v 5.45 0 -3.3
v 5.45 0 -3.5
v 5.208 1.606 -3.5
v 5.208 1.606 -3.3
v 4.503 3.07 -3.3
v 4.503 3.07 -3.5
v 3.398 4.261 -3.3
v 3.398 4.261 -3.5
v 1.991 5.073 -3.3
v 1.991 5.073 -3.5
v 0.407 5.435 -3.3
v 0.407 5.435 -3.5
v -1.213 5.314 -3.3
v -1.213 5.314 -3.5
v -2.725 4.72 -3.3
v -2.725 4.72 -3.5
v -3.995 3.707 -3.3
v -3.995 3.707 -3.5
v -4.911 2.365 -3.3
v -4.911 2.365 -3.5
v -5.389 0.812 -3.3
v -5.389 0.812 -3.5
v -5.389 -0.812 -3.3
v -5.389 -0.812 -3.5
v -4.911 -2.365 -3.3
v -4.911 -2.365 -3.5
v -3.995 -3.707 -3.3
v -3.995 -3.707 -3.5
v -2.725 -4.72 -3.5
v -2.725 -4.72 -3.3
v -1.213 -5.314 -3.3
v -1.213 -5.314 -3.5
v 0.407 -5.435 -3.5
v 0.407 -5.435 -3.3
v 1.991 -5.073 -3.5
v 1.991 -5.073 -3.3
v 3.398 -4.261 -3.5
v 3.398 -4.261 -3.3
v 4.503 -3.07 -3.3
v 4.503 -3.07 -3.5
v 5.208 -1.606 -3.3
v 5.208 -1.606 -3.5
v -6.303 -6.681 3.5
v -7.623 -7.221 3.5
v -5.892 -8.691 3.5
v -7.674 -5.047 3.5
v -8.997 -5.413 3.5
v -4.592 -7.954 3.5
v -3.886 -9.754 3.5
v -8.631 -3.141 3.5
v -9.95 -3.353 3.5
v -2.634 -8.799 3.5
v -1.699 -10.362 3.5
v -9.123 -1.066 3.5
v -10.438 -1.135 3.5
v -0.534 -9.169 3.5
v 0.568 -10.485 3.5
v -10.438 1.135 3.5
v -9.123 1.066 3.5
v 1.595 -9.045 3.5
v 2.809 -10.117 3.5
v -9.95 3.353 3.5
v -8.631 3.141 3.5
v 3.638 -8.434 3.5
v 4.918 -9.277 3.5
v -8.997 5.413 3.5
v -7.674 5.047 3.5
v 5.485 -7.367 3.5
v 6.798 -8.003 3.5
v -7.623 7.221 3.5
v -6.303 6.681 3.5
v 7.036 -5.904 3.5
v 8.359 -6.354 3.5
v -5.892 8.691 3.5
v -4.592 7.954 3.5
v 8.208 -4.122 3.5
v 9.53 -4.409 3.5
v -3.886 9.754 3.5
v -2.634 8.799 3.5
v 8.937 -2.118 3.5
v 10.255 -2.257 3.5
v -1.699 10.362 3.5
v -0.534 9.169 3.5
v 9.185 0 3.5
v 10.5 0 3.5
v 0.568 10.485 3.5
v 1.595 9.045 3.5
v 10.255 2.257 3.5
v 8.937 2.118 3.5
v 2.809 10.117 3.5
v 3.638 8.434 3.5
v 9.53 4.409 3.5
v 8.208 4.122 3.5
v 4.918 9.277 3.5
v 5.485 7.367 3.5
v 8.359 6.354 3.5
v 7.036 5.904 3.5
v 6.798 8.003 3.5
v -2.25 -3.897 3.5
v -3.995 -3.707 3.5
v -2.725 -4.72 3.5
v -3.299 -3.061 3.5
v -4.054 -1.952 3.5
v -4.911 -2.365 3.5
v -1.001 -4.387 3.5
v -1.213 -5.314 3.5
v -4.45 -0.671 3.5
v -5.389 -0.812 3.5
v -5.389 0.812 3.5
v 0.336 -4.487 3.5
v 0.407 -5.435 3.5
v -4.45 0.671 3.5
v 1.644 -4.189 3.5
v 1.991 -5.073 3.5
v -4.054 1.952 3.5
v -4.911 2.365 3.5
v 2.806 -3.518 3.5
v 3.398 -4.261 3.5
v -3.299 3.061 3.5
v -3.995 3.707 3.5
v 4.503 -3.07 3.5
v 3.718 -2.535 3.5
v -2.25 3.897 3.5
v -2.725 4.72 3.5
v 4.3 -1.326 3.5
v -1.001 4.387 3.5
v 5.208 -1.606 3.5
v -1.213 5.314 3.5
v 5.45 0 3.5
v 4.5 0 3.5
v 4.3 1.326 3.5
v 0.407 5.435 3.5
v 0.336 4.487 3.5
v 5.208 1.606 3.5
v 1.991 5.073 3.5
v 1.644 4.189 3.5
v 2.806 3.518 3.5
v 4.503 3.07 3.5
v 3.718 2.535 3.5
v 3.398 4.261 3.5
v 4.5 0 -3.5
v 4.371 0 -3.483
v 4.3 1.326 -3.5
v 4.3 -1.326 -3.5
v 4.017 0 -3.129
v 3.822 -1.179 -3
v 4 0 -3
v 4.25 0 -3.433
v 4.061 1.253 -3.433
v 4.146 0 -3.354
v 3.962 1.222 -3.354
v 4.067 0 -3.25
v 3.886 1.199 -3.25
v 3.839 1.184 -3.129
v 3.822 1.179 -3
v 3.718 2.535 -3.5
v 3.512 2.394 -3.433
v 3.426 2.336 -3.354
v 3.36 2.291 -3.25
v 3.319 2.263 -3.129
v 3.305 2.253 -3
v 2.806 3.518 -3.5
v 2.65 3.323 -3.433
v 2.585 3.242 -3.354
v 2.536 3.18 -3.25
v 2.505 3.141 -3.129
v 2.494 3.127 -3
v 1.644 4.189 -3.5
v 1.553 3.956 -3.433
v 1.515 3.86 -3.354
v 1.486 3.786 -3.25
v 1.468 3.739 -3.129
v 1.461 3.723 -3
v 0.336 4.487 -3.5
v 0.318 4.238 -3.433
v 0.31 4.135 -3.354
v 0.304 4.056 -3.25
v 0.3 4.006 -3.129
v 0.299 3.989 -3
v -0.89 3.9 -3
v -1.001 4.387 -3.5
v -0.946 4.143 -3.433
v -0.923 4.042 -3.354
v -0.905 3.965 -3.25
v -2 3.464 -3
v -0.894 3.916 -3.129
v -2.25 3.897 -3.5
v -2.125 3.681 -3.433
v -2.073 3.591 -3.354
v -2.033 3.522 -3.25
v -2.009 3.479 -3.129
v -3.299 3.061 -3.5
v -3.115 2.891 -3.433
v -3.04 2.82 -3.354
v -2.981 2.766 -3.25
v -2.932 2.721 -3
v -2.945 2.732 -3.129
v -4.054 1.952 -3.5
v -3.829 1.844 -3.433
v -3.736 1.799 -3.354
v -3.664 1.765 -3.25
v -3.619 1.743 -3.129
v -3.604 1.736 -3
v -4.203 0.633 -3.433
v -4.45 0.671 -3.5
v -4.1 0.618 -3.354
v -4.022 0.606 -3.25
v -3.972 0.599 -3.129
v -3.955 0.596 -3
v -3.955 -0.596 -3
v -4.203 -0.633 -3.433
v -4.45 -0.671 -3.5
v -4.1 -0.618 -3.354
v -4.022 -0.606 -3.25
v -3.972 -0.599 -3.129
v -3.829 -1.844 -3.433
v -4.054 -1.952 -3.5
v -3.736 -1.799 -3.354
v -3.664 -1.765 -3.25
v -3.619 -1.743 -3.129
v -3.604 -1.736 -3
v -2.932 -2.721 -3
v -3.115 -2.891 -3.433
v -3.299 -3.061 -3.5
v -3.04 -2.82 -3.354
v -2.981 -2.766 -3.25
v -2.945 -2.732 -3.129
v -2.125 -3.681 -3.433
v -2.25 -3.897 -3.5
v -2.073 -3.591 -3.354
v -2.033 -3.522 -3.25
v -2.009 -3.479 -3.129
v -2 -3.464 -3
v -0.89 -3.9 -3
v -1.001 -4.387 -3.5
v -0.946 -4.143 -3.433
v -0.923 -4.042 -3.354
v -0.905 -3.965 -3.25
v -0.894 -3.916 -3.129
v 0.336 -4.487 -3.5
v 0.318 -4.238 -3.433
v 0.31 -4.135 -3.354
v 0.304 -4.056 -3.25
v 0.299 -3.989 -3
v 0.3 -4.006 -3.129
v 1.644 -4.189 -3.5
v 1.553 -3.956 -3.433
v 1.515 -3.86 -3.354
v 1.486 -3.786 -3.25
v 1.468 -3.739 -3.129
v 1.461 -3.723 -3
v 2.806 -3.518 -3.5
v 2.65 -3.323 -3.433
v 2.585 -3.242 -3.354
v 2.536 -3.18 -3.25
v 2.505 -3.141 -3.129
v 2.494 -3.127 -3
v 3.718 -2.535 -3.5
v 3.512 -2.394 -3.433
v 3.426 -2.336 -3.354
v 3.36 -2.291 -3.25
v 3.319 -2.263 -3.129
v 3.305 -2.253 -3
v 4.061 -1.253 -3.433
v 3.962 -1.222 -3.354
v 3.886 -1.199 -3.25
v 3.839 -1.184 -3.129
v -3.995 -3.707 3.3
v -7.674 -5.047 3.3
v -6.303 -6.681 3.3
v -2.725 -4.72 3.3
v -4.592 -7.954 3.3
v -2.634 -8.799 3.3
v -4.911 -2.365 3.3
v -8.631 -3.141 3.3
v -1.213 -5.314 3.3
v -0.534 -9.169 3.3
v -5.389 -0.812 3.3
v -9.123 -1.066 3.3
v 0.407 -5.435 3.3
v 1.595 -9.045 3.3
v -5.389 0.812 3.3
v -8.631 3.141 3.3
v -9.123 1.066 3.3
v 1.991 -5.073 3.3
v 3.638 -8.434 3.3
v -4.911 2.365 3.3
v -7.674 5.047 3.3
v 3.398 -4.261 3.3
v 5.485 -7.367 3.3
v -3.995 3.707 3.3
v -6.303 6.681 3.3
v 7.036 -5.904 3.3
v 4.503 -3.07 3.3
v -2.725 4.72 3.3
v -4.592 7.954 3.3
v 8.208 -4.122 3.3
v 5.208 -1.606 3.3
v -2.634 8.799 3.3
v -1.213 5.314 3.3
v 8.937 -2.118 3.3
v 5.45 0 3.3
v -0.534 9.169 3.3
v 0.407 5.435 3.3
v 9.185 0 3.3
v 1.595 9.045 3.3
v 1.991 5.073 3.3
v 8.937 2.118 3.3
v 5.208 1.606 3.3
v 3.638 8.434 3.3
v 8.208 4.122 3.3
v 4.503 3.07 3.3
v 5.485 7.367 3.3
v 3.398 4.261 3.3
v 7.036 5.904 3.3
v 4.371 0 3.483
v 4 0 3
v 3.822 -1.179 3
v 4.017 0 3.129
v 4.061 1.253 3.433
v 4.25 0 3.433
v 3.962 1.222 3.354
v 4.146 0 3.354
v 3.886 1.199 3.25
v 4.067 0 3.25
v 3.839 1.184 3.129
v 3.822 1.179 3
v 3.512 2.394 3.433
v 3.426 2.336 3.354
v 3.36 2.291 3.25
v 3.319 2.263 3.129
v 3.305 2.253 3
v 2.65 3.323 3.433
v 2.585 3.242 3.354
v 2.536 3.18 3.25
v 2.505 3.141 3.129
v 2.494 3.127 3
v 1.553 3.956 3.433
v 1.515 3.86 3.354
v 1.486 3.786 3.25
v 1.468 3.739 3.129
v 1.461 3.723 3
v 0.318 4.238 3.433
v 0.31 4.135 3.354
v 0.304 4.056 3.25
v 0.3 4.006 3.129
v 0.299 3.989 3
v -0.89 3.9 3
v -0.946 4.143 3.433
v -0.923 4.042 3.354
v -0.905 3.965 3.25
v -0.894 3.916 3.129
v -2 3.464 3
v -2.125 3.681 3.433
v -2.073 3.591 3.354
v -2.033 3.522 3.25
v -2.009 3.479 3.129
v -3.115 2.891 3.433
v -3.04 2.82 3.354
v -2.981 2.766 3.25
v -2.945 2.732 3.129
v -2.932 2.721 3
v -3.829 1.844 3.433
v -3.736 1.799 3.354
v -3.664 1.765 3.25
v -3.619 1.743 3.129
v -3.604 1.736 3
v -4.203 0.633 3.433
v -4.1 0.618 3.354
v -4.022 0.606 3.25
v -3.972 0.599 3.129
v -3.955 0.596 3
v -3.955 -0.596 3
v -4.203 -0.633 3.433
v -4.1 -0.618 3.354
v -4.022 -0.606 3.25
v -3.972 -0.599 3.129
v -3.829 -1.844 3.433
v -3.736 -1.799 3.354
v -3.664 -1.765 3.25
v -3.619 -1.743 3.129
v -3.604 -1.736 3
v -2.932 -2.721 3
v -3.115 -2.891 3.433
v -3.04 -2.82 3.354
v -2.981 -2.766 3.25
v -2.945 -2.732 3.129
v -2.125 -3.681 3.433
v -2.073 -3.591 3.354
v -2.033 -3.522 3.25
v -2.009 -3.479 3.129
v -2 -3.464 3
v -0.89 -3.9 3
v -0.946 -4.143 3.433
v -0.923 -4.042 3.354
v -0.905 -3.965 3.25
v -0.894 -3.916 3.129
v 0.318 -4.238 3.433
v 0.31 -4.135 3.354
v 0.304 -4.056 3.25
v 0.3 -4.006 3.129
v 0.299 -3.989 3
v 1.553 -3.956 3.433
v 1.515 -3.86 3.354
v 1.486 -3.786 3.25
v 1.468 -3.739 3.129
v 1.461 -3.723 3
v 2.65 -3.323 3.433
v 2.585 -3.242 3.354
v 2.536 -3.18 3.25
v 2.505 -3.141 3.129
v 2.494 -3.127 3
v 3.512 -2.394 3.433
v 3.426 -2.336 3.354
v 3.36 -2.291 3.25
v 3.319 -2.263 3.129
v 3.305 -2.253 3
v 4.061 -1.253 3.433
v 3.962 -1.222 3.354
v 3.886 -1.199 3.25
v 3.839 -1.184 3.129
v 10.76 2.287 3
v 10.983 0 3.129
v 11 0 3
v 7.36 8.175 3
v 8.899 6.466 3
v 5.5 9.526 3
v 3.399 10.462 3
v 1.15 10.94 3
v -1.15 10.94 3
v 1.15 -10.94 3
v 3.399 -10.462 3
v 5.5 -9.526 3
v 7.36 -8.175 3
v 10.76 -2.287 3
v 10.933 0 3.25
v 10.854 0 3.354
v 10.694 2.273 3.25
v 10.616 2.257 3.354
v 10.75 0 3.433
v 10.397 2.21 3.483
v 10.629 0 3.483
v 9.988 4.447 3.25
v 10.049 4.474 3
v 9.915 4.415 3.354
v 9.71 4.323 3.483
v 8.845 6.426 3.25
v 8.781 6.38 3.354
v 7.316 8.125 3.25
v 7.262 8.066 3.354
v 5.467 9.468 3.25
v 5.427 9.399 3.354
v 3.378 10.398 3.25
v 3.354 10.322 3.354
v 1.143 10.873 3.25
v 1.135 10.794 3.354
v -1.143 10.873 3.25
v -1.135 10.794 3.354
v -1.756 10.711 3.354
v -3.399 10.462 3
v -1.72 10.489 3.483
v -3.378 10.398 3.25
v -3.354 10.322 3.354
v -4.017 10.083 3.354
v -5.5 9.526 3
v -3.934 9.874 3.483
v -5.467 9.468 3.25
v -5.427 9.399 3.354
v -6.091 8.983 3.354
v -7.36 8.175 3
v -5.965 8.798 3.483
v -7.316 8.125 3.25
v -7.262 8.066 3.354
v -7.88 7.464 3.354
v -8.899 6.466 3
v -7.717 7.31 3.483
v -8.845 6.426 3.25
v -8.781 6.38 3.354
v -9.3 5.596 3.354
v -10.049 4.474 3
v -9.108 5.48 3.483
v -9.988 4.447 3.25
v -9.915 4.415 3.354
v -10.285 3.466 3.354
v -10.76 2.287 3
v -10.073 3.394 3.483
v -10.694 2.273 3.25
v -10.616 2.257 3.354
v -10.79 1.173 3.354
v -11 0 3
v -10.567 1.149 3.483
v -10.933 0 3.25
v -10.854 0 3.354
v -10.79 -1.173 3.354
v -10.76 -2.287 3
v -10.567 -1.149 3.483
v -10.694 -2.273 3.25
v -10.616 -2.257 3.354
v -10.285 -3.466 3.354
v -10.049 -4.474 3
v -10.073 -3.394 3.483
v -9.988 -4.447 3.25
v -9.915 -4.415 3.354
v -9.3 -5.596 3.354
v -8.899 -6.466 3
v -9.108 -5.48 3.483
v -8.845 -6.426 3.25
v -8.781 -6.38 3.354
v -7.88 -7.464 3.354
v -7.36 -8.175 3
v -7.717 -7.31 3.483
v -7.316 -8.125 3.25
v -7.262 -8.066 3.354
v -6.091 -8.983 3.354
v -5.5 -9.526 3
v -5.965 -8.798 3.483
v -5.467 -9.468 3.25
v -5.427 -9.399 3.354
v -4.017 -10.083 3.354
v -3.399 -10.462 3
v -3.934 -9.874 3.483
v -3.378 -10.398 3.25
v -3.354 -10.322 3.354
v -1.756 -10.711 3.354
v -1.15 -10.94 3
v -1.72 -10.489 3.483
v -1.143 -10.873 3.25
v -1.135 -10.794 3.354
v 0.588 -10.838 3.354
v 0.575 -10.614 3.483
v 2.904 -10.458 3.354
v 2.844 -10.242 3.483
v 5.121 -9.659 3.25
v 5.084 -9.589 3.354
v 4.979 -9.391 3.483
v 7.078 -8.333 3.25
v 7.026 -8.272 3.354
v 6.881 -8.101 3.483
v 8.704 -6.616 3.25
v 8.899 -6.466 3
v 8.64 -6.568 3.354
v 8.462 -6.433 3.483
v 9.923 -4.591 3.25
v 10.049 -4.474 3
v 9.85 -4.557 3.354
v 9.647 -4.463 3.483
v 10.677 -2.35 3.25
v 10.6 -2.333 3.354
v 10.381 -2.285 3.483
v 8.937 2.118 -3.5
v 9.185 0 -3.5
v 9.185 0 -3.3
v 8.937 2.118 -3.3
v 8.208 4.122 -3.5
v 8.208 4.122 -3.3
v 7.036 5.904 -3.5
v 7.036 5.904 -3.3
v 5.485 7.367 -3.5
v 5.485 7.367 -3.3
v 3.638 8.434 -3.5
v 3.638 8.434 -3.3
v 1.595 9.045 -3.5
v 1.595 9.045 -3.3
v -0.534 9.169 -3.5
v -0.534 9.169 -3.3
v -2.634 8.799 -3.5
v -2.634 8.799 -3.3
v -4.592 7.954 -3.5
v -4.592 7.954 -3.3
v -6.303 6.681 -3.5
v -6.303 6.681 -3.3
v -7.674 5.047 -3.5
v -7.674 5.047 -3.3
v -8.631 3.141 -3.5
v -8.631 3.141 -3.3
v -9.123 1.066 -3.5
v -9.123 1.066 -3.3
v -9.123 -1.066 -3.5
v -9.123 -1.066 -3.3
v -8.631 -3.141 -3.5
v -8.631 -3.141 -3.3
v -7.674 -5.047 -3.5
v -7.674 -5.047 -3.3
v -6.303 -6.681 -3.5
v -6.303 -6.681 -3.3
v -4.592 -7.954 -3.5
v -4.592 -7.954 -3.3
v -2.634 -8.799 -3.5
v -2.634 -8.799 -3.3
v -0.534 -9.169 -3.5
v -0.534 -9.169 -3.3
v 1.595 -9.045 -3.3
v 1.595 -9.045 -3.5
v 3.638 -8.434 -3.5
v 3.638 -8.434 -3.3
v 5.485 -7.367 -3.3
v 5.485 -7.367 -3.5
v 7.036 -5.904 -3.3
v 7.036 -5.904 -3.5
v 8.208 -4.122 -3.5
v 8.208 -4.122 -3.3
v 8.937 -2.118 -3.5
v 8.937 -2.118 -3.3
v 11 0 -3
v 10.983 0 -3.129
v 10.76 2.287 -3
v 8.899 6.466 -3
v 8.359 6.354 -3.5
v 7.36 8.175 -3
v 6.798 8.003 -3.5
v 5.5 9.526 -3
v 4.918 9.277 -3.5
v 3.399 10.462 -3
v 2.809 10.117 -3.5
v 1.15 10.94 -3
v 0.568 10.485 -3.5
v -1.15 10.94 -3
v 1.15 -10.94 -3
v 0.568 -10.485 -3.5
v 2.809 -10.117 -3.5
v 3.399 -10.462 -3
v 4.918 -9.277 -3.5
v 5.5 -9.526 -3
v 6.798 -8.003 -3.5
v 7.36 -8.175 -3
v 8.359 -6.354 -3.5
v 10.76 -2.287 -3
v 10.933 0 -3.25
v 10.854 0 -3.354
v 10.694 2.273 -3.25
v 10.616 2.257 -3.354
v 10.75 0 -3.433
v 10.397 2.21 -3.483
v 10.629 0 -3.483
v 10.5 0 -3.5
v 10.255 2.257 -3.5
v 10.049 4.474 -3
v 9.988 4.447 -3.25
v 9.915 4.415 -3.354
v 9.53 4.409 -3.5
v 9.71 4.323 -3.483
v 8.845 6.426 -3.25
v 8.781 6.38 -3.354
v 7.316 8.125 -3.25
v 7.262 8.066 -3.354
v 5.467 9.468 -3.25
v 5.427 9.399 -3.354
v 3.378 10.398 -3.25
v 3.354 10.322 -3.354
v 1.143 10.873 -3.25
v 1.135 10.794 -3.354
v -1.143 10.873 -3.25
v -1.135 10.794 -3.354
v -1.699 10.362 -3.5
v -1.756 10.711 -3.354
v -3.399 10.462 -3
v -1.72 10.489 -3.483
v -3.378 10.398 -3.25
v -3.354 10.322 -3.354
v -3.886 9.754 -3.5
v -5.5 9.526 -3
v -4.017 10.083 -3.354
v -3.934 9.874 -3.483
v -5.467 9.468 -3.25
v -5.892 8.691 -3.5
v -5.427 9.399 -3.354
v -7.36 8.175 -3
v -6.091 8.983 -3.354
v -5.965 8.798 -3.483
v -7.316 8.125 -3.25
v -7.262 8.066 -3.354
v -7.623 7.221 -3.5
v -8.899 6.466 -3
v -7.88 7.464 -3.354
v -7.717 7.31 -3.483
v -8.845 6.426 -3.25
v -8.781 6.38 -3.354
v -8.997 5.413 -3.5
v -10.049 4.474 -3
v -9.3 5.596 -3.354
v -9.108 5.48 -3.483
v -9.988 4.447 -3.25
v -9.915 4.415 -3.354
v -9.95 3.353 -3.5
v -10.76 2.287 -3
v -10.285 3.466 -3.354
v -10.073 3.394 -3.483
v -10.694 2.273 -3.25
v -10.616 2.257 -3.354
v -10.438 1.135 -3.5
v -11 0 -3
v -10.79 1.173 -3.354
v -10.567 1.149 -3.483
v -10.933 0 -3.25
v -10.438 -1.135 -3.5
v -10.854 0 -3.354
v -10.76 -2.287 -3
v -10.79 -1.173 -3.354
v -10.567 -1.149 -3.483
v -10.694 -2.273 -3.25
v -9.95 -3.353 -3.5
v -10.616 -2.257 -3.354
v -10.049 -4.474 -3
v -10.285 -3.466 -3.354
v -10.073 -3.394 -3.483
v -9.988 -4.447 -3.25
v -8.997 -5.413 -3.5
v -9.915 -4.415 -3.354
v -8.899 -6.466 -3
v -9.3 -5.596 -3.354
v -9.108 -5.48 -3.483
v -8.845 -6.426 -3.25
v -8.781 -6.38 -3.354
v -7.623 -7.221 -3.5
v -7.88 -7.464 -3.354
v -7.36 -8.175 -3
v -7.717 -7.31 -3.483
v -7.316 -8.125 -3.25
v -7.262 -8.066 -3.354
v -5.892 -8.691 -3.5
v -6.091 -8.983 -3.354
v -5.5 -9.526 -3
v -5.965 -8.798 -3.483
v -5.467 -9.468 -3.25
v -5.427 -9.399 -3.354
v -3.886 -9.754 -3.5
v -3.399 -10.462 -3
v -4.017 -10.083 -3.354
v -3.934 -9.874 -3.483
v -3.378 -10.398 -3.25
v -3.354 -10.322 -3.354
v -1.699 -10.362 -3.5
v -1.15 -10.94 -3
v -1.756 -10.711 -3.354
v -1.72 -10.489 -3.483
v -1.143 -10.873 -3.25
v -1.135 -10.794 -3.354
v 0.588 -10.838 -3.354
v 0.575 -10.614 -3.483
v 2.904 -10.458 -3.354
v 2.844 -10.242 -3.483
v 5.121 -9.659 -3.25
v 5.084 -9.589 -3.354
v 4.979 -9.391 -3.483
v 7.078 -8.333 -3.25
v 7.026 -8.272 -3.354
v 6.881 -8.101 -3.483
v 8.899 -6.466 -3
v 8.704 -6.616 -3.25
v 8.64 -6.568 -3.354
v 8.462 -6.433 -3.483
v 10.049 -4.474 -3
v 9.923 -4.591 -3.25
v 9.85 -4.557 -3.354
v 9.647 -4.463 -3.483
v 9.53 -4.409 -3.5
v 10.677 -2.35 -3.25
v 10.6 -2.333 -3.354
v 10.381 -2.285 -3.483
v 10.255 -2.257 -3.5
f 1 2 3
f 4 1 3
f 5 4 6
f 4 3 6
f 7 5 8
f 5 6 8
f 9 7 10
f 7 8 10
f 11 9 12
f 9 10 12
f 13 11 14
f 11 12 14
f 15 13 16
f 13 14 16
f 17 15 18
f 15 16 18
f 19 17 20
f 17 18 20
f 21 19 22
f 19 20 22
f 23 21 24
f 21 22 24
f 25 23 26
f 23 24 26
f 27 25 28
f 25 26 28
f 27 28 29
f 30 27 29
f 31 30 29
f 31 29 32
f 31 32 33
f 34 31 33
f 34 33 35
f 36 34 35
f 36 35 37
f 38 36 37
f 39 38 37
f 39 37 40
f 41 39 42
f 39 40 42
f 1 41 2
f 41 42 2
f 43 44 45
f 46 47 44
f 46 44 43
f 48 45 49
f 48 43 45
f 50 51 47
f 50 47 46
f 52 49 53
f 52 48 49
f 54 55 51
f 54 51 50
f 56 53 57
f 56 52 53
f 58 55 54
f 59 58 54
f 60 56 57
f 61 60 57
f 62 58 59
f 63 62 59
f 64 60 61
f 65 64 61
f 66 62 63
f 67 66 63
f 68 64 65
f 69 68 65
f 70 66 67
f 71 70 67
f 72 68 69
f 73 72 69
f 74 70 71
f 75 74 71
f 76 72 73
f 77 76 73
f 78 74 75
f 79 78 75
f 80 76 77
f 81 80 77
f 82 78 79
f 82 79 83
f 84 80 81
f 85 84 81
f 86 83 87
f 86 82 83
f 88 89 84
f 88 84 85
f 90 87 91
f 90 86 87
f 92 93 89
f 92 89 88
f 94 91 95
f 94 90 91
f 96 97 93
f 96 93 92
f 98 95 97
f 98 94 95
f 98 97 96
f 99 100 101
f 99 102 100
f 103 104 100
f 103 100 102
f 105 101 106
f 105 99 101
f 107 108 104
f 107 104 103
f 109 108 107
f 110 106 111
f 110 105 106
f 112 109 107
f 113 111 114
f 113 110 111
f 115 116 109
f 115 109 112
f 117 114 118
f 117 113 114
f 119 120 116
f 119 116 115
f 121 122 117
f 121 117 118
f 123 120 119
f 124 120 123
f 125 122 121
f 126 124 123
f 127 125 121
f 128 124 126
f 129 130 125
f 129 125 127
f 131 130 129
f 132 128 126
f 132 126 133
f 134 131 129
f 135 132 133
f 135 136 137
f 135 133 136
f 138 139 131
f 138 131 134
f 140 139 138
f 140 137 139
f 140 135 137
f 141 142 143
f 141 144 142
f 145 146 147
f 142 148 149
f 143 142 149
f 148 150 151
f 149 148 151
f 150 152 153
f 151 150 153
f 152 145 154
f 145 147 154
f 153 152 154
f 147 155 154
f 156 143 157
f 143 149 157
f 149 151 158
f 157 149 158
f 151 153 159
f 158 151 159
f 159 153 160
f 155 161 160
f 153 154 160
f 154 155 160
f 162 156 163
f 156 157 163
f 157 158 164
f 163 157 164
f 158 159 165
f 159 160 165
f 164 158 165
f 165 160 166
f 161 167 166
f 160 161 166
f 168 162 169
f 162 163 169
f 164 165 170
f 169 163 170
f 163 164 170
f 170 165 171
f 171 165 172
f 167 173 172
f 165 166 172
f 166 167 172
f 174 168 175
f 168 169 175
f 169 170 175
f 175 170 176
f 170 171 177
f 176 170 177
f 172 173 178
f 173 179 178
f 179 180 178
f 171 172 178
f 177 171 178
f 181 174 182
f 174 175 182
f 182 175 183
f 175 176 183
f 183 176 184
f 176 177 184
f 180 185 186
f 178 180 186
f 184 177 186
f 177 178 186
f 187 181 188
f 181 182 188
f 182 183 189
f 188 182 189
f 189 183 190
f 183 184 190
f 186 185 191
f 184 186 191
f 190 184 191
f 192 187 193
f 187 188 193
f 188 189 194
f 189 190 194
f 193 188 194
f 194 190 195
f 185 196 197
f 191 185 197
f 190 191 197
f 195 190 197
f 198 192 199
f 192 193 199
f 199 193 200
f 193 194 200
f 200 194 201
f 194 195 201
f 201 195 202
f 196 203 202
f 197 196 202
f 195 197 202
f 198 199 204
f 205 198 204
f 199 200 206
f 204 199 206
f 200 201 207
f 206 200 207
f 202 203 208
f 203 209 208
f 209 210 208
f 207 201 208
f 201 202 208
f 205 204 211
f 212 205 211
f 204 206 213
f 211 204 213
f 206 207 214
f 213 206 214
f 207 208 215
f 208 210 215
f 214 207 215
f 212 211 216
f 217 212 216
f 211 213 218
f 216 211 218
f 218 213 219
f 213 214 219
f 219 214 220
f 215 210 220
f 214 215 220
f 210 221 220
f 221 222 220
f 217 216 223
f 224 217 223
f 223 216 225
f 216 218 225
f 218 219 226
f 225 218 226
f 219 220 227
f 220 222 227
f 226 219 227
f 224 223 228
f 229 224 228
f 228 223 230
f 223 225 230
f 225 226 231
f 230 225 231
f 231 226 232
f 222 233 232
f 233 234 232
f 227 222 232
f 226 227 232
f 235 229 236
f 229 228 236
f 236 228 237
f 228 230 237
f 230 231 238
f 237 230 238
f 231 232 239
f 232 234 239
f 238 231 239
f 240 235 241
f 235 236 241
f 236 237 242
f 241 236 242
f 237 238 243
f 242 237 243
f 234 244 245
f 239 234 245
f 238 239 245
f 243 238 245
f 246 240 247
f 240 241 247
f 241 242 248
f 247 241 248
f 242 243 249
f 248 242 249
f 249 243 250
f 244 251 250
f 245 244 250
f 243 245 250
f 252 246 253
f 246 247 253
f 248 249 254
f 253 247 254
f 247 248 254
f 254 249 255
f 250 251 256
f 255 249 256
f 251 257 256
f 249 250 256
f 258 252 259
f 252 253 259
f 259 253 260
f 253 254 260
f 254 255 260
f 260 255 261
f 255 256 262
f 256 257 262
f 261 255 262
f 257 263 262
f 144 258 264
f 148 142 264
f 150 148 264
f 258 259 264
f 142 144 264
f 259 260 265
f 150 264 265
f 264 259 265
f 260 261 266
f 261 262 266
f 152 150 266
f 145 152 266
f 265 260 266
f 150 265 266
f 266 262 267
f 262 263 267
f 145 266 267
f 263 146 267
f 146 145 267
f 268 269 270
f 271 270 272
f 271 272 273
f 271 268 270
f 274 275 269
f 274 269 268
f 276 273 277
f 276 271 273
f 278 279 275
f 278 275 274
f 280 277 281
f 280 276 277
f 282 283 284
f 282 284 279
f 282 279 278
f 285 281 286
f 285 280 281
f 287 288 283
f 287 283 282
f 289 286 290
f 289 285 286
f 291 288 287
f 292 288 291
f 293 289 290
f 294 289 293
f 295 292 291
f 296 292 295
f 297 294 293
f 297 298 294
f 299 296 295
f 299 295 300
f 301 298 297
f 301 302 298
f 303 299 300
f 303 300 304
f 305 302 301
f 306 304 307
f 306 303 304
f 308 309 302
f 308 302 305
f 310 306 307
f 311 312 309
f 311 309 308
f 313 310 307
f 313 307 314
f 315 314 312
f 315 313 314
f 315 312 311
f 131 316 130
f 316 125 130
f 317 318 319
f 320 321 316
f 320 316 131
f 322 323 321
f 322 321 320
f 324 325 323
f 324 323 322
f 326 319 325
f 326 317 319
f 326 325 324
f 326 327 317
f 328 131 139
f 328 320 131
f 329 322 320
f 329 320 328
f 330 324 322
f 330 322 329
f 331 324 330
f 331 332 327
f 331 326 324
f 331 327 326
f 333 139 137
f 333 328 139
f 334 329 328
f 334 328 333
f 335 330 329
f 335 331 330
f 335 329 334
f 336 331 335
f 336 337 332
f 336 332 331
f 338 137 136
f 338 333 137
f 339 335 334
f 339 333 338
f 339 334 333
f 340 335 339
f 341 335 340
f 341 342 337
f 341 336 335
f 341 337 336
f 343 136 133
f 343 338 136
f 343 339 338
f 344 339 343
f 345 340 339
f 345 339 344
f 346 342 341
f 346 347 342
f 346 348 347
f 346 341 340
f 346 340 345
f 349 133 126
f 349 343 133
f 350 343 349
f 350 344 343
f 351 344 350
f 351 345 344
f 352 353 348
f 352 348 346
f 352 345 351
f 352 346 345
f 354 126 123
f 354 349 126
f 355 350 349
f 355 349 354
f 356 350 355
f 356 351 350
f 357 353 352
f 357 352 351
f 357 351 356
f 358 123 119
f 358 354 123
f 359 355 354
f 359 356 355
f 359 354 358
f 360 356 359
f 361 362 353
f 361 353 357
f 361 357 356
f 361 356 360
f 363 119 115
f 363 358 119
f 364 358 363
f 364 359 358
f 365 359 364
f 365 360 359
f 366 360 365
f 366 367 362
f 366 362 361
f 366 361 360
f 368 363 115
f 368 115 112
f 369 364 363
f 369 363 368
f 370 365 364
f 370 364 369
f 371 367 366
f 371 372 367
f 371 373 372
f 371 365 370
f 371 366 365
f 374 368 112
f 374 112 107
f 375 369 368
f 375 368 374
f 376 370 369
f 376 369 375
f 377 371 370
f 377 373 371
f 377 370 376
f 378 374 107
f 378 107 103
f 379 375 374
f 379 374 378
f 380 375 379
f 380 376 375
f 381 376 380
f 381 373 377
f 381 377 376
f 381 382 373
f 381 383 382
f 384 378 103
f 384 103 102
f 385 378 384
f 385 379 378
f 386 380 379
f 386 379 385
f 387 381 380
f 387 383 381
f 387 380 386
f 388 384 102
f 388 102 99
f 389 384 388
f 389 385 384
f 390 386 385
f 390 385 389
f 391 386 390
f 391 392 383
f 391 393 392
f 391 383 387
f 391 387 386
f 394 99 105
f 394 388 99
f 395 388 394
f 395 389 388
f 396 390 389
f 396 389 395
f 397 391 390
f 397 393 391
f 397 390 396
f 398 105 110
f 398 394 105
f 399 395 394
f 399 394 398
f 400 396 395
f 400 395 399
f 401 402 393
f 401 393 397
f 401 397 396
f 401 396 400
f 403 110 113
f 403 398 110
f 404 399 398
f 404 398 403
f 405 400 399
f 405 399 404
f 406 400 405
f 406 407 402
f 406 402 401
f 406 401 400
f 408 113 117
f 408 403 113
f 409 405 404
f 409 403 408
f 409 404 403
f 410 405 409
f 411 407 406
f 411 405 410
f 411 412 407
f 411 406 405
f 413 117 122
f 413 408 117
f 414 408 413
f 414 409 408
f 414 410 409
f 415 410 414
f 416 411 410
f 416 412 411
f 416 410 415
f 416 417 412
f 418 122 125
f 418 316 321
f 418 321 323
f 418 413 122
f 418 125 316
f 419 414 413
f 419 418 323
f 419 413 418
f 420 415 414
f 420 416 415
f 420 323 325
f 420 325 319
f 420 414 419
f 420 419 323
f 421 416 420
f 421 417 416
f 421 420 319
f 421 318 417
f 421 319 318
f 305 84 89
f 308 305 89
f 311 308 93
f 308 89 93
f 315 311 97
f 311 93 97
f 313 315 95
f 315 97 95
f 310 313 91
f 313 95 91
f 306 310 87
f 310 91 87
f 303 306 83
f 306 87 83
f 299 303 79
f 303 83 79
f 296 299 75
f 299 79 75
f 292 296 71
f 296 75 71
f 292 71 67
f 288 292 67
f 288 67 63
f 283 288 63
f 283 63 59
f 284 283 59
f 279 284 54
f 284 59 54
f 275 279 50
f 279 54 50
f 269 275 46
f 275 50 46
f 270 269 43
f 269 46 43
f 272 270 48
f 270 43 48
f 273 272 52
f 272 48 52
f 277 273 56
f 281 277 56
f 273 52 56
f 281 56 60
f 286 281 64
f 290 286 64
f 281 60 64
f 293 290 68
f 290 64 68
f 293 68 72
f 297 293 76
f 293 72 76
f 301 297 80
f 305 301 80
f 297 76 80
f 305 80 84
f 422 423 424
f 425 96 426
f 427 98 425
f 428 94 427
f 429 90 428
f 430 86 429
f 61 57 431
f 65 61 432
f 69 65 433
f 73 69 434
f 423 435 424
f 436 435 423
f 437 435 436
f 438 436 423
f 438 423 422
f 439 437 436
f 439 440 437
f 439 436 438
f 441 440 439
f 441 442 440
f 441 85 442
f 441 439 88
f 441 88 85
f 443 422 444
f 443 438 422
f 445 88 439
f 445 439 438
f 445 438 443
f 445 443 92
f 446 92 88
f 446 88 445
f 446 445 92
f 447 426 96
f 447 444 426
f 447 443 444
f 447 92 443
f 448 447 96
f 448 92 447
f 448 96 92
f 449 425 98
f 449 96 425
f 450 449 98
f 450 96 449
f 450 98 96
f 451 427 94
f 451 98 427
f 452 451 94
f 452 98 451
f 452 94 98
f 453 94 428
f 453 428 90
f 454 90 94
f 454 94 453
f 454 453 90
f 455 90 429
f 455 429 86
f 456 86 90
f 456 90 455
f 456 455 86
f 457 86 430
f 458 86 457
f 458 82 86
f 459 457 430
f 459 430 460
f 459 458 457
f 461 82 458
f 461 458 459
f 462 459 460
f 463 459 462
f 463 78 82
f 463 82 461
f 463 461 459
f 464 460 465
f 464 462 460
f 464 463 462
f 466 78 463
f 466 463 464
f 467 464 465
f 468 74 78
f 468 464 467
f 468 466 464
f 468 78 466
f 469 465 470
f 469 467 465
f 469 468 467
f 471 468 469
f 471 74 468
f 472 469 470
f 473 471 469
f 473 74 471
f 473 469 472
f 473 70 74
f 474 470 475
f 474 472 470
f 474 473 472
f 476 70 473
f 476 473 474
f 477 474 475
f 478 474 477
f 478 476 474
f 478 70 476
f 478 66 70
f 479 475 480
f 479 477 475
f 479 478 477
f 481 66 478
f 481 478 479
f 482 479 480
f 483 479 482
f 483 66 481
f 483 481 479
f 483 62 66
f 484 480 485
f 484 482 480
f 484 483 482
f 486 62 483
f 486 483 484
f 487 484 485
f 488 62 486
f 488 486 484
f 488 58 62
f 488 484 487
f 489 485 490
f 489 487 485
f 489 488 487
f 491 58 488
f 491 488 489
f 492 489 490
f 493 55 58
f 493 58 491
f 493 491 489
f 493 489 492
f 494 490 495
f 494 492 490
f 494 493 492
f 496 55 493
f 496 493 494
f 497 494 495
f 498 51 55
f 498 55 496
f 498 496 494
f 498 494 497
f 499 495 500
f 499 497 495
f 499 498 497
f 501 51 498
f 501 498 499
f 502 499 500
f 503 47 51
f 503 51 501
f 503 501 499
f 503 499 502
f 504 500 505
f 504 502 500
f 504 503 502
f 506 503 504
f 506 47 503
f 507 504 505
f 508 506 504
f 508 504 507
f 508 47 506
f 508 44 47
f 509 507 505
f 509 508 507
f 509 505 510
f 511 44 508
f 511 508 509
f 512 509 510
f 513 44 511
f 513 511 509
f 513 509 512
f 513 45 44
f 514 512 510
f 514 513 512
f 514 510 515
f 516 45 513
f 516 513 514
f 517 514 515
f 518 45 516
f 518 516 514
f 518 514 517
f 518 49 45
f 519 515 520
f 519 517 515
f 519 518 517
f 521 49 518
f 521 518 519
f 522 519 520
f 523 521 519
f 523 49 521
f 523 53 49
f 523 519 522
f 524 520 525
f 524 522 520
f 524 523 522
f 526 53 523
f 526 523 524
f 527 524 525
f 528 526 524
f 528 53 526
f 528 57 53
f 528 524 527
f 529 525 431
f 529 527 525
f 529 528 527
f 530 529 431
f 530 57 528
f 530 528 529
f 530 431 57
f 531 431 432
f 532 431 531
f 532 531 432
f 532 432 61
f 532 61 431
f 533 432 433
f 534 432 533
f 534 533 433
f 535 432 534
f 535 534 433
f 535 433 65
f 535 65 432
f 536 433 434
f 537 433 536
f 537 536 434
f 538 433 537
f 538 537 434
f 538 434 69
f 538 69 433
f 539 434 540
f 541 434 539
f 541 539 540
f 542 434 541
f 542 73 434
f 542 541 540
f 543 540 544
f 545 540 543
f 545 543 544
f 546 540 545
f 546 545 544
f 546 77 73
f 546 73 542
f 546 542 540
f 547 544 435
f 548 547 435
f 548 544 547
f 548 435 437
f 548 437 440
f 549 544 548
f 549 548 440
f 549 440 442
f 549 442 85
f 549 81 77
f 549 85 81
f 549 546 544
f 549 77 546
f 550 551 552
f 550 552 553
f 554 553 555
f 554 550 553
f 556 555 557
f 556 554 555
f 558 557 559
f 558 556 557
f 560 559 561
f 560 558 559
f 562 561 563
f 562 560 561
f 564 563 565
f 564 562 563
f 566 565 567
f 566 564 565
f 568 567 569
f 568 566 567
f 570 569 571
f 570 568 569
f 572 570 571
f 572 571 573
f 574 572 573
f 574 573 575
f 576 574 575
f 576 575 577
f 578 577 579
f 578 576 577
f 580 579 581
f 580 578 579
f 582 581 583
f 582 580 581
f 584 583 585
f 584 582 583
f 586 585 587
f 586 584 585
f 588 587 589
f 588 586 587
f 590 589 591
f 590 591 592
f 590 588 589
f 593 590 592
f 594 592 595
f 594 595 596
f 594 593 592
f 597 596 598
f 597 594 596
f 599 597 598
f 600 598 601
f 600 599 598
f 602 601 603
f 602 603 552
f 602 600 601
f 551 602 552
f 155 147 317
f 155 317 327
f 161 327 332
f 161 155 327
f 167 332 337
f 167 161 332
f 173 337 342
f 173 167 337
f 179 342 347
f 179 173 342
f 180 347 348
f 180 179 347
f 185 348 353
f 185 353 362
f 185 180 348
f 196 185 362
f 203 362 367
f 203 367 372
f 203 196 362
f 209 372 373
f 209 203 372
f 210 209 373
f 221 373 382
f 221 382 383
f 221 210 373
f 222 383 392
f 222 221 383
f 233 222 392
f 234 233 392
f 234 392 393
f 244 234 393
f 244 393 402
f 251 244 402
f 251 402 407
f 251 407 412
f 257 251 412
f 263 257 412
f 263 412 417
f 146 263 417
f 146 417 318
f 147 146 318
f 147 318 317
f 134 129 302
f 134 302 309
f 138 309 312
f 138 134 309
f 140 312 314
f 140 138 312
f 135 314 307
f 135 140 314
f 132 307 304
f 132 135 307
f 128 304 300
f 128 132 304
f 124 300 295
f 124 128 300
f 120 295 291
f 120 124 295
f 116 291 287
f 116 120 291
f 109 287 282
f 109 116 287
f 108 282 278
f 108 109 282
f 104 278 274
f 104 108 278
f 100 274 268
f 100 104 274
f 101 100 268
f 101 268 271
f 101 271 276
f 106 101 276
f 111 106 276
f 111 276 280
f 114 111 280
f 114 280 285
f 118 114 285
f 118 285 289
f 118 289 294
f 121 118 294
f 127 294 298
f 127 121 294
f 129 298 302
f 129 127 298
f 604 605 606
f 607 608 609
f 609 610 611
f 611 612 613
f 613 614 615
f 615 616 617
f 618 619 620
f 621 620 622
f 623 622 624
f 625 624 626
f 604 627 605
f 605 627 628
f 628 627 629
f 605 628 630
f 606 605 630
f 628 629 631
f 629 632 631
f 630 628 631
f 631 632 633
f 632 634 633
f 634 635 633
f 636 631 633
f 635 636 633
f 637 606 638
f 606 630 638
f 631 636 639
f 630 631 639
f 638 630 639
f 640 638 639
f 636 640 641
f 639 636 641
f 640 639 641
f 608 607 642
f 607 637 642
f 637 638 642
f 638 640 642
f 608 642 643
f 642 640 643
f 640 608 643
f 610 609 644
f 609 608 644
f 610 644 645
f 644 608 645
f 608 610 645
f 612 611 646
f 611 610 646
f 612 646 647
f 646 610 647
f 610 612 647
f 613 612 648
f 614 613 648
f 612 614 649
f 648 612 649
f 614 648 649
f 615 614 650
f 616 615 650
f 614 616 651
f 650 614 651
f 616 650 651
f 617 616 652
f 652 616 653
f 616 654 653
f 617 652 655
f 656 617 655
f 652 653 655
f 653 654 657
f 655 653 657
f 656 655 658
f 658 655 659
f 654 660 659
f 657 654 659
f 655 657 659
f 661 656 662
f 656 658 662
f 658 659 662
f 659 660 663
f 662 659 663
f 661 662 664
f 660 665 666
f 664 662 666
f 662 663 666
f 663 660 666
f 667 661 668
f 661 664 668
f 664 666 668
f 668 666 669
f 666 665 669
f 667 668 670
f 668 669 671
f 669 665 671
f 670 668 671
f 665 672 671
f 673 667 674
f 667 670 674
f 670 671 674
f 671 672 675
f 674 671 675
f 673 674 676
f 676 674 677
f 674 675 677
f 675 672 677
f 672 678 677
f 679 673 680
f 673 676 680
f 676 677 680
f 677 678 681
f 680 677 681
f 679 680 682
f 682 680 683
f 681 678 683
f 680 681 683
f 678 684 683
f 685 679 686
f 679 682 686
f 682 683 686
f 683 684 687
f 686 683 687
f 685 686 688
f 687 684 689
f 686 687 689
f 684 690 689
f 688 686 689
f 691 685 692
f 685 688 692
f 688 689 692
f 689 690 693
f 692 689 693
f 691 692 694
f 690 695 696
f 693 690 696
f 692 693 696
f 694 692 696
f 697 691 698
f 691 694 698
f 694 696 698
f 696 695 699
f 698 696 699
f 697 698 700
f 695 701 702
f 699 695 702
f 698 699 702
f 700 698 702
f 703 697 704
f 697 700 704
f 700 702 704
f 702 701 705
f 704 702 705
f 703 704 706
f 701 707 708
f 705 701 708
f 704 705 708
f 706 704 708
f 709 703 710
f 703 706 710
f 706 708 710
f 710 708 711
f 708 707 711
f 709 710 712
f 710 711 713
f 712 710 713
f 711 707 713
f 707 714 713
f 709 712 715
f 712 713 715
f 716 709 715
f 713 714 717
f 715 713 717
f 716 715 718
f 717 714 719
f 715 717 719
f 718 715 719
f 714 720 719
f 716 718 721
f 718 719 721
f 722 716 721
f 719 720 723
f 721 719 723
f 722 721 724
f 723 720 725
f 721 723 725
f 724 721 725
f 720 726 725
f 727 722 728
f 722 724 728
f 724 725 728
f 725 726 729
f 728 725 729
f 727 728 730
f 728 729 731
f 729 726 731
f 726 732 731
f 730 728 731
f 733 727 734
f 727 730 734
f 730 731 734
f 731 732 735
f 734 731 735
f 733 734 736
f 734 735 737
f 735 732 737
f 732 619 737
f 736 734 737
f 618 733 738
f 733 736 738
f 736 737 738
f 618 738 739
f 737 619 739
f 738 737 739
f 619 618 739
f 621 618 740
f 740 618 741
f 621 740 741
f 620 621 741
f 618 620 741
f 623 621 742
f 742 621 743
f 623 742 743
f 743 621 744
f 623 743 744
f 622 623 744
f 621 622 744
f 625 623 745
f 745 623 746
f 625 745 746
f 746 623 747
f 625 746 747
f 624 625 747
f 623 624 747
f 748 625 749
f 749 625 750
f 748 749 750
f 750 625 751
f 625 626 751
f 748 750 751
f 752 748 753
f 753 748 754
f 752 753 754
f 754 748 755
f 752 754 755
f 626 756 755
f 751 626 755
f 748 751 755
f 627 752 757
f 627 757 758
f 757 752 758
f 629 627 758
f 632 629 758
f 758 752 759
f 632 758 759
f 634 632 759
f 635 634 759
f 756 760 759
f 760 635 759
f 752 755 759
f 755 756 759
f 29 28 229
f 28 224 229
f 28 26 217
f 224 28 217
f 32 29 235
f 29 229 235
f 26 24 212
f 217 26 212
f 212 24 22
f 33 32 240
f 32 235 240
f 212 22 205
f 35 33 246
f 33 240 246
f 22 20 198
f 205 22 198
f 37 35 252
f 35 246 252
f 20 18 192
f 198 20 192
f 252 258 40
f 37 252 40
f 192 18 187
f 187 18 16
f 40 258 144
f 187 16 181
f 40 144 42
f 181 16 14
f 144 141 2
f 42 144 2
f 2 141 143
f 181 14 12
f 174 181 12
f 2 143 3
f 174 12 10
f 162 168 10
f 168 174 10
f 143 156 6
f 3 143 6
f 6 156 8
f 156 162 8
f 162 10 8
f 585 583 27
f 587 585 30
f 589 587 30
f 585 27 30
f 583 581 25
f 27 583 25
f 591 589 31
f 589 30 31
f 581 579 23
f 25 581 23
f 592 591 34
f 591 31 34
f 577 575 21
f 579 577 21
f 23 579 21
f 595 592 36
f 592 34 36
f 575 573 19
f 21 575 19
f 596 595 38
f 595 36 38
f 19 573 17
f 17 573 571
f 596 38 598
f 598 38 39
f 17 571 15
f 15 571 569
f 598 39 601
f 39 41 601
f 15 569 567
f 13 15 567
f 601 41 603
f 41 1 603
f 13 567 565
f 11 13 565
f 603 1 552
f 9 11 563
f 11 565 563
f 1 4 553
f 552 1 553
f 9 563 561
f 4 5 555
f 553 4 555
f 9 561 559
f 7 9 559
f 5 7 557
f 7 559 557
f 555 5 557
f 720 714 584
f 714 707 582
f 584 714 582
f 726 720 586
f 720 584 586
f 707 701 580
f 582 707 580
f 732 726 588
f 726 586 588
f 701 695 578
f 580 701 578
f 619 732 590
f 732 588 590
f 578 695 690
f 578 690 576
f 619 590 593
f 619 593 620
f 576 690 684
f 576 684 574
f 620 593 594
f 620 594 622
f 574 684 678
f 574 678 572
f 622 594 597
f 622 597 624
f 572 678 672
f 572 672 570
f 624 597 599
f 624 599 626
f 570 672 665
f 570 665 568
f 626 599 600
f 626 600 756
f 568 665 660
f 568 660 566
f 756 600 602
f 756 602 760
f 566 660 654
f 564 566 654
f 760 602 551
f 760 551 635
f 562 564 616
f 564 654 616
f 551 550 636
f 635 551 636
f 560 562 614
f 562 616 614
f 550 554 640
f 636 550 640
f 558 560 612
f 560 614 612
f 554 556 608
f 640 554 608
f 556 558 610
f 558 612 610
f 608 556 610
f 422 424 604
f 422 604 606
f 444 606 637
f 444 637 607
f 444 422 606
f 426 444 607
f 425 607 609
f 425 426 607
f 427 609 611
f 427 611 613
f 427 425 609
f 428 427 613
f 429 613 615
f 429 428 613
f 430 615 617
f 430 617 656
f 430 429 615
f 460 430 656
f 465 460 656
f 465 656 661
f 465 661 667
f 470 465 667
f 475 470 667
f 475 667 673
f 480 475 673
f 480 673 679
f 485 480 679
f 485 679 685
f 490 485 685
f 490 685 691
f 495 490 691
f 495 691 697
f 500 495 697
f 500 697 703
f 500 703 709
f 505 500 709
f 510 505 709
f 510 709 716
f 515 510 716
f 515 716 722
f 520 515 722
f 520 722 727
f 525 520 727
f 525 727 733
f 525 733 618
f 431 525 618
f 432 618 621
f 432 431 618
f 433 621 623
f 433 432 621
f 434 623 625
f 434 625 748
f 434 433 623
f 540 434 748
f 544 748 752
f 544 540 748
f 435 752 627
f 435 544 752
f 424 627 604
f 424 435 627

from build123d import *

# Parameters (mm, degrees)
SZKIC1_R                    = 11
SZKIC1_R_2                  = 4
DODANIE_WYCI_GNI_CIE1_DEPTH = 3.5
SZKIC2_R                    = 9.184724544
SZKIC2_R_2                  = 5.450254851
WYTNIJ_WYCI_GNI_CIE1_DEPTH  = 0.2
ZAOKR_GLENIE1_R             = 0.5


with BuildPart() as part:
    # Szkic1 → Dodanie-wyciągnięcie1 (new body, symmetric)
    with BuildSketch(Plane.XY):
        Circle(SZKIC1_R)
        Circle(SZKIC1_R_2, mode=Mode.SUBTRACT)
    extrude(amount=DODANIE_WYCI_GNI_CIE1_DEPTH, both=True)

    # Szkic2 → Wytnij-wyciągnięcie1 (cut)
    with BuildSketch(Plane.XY.offset(3.5)):
        Circle(SZKIC2_R)
        Circle(SZKIC2_R_2, mode=Mode.SUBTRACT)
    wytnij_wyci_gni_cie1 = extrude(amount=-WYTNIJ_WYCI_GNI_CIE1_DEPTH, mode=Mode.SUBTRACT)

    # Lustro1: Wytnij-wyciągnięcie1 across plane
    add(wytnij_wyci_gni_cie1.mirror(Plane.XY), mode=Mode.SUBTRACT)

    # Zaokrąglenie1
    zaokr_glenie1_edges = [part.edges().sort_by_distance(p)[0] for p in [
        (-11, 0, -3.5),
        (-11, 0, 3.5),
        (-4, 0, -3.5),
        (-4, 0, 3.5),
    ]]
    fillet(zaokr_glenie1_edges, radius=ZAOKR_GLENIE1_R)


solid = part.part
